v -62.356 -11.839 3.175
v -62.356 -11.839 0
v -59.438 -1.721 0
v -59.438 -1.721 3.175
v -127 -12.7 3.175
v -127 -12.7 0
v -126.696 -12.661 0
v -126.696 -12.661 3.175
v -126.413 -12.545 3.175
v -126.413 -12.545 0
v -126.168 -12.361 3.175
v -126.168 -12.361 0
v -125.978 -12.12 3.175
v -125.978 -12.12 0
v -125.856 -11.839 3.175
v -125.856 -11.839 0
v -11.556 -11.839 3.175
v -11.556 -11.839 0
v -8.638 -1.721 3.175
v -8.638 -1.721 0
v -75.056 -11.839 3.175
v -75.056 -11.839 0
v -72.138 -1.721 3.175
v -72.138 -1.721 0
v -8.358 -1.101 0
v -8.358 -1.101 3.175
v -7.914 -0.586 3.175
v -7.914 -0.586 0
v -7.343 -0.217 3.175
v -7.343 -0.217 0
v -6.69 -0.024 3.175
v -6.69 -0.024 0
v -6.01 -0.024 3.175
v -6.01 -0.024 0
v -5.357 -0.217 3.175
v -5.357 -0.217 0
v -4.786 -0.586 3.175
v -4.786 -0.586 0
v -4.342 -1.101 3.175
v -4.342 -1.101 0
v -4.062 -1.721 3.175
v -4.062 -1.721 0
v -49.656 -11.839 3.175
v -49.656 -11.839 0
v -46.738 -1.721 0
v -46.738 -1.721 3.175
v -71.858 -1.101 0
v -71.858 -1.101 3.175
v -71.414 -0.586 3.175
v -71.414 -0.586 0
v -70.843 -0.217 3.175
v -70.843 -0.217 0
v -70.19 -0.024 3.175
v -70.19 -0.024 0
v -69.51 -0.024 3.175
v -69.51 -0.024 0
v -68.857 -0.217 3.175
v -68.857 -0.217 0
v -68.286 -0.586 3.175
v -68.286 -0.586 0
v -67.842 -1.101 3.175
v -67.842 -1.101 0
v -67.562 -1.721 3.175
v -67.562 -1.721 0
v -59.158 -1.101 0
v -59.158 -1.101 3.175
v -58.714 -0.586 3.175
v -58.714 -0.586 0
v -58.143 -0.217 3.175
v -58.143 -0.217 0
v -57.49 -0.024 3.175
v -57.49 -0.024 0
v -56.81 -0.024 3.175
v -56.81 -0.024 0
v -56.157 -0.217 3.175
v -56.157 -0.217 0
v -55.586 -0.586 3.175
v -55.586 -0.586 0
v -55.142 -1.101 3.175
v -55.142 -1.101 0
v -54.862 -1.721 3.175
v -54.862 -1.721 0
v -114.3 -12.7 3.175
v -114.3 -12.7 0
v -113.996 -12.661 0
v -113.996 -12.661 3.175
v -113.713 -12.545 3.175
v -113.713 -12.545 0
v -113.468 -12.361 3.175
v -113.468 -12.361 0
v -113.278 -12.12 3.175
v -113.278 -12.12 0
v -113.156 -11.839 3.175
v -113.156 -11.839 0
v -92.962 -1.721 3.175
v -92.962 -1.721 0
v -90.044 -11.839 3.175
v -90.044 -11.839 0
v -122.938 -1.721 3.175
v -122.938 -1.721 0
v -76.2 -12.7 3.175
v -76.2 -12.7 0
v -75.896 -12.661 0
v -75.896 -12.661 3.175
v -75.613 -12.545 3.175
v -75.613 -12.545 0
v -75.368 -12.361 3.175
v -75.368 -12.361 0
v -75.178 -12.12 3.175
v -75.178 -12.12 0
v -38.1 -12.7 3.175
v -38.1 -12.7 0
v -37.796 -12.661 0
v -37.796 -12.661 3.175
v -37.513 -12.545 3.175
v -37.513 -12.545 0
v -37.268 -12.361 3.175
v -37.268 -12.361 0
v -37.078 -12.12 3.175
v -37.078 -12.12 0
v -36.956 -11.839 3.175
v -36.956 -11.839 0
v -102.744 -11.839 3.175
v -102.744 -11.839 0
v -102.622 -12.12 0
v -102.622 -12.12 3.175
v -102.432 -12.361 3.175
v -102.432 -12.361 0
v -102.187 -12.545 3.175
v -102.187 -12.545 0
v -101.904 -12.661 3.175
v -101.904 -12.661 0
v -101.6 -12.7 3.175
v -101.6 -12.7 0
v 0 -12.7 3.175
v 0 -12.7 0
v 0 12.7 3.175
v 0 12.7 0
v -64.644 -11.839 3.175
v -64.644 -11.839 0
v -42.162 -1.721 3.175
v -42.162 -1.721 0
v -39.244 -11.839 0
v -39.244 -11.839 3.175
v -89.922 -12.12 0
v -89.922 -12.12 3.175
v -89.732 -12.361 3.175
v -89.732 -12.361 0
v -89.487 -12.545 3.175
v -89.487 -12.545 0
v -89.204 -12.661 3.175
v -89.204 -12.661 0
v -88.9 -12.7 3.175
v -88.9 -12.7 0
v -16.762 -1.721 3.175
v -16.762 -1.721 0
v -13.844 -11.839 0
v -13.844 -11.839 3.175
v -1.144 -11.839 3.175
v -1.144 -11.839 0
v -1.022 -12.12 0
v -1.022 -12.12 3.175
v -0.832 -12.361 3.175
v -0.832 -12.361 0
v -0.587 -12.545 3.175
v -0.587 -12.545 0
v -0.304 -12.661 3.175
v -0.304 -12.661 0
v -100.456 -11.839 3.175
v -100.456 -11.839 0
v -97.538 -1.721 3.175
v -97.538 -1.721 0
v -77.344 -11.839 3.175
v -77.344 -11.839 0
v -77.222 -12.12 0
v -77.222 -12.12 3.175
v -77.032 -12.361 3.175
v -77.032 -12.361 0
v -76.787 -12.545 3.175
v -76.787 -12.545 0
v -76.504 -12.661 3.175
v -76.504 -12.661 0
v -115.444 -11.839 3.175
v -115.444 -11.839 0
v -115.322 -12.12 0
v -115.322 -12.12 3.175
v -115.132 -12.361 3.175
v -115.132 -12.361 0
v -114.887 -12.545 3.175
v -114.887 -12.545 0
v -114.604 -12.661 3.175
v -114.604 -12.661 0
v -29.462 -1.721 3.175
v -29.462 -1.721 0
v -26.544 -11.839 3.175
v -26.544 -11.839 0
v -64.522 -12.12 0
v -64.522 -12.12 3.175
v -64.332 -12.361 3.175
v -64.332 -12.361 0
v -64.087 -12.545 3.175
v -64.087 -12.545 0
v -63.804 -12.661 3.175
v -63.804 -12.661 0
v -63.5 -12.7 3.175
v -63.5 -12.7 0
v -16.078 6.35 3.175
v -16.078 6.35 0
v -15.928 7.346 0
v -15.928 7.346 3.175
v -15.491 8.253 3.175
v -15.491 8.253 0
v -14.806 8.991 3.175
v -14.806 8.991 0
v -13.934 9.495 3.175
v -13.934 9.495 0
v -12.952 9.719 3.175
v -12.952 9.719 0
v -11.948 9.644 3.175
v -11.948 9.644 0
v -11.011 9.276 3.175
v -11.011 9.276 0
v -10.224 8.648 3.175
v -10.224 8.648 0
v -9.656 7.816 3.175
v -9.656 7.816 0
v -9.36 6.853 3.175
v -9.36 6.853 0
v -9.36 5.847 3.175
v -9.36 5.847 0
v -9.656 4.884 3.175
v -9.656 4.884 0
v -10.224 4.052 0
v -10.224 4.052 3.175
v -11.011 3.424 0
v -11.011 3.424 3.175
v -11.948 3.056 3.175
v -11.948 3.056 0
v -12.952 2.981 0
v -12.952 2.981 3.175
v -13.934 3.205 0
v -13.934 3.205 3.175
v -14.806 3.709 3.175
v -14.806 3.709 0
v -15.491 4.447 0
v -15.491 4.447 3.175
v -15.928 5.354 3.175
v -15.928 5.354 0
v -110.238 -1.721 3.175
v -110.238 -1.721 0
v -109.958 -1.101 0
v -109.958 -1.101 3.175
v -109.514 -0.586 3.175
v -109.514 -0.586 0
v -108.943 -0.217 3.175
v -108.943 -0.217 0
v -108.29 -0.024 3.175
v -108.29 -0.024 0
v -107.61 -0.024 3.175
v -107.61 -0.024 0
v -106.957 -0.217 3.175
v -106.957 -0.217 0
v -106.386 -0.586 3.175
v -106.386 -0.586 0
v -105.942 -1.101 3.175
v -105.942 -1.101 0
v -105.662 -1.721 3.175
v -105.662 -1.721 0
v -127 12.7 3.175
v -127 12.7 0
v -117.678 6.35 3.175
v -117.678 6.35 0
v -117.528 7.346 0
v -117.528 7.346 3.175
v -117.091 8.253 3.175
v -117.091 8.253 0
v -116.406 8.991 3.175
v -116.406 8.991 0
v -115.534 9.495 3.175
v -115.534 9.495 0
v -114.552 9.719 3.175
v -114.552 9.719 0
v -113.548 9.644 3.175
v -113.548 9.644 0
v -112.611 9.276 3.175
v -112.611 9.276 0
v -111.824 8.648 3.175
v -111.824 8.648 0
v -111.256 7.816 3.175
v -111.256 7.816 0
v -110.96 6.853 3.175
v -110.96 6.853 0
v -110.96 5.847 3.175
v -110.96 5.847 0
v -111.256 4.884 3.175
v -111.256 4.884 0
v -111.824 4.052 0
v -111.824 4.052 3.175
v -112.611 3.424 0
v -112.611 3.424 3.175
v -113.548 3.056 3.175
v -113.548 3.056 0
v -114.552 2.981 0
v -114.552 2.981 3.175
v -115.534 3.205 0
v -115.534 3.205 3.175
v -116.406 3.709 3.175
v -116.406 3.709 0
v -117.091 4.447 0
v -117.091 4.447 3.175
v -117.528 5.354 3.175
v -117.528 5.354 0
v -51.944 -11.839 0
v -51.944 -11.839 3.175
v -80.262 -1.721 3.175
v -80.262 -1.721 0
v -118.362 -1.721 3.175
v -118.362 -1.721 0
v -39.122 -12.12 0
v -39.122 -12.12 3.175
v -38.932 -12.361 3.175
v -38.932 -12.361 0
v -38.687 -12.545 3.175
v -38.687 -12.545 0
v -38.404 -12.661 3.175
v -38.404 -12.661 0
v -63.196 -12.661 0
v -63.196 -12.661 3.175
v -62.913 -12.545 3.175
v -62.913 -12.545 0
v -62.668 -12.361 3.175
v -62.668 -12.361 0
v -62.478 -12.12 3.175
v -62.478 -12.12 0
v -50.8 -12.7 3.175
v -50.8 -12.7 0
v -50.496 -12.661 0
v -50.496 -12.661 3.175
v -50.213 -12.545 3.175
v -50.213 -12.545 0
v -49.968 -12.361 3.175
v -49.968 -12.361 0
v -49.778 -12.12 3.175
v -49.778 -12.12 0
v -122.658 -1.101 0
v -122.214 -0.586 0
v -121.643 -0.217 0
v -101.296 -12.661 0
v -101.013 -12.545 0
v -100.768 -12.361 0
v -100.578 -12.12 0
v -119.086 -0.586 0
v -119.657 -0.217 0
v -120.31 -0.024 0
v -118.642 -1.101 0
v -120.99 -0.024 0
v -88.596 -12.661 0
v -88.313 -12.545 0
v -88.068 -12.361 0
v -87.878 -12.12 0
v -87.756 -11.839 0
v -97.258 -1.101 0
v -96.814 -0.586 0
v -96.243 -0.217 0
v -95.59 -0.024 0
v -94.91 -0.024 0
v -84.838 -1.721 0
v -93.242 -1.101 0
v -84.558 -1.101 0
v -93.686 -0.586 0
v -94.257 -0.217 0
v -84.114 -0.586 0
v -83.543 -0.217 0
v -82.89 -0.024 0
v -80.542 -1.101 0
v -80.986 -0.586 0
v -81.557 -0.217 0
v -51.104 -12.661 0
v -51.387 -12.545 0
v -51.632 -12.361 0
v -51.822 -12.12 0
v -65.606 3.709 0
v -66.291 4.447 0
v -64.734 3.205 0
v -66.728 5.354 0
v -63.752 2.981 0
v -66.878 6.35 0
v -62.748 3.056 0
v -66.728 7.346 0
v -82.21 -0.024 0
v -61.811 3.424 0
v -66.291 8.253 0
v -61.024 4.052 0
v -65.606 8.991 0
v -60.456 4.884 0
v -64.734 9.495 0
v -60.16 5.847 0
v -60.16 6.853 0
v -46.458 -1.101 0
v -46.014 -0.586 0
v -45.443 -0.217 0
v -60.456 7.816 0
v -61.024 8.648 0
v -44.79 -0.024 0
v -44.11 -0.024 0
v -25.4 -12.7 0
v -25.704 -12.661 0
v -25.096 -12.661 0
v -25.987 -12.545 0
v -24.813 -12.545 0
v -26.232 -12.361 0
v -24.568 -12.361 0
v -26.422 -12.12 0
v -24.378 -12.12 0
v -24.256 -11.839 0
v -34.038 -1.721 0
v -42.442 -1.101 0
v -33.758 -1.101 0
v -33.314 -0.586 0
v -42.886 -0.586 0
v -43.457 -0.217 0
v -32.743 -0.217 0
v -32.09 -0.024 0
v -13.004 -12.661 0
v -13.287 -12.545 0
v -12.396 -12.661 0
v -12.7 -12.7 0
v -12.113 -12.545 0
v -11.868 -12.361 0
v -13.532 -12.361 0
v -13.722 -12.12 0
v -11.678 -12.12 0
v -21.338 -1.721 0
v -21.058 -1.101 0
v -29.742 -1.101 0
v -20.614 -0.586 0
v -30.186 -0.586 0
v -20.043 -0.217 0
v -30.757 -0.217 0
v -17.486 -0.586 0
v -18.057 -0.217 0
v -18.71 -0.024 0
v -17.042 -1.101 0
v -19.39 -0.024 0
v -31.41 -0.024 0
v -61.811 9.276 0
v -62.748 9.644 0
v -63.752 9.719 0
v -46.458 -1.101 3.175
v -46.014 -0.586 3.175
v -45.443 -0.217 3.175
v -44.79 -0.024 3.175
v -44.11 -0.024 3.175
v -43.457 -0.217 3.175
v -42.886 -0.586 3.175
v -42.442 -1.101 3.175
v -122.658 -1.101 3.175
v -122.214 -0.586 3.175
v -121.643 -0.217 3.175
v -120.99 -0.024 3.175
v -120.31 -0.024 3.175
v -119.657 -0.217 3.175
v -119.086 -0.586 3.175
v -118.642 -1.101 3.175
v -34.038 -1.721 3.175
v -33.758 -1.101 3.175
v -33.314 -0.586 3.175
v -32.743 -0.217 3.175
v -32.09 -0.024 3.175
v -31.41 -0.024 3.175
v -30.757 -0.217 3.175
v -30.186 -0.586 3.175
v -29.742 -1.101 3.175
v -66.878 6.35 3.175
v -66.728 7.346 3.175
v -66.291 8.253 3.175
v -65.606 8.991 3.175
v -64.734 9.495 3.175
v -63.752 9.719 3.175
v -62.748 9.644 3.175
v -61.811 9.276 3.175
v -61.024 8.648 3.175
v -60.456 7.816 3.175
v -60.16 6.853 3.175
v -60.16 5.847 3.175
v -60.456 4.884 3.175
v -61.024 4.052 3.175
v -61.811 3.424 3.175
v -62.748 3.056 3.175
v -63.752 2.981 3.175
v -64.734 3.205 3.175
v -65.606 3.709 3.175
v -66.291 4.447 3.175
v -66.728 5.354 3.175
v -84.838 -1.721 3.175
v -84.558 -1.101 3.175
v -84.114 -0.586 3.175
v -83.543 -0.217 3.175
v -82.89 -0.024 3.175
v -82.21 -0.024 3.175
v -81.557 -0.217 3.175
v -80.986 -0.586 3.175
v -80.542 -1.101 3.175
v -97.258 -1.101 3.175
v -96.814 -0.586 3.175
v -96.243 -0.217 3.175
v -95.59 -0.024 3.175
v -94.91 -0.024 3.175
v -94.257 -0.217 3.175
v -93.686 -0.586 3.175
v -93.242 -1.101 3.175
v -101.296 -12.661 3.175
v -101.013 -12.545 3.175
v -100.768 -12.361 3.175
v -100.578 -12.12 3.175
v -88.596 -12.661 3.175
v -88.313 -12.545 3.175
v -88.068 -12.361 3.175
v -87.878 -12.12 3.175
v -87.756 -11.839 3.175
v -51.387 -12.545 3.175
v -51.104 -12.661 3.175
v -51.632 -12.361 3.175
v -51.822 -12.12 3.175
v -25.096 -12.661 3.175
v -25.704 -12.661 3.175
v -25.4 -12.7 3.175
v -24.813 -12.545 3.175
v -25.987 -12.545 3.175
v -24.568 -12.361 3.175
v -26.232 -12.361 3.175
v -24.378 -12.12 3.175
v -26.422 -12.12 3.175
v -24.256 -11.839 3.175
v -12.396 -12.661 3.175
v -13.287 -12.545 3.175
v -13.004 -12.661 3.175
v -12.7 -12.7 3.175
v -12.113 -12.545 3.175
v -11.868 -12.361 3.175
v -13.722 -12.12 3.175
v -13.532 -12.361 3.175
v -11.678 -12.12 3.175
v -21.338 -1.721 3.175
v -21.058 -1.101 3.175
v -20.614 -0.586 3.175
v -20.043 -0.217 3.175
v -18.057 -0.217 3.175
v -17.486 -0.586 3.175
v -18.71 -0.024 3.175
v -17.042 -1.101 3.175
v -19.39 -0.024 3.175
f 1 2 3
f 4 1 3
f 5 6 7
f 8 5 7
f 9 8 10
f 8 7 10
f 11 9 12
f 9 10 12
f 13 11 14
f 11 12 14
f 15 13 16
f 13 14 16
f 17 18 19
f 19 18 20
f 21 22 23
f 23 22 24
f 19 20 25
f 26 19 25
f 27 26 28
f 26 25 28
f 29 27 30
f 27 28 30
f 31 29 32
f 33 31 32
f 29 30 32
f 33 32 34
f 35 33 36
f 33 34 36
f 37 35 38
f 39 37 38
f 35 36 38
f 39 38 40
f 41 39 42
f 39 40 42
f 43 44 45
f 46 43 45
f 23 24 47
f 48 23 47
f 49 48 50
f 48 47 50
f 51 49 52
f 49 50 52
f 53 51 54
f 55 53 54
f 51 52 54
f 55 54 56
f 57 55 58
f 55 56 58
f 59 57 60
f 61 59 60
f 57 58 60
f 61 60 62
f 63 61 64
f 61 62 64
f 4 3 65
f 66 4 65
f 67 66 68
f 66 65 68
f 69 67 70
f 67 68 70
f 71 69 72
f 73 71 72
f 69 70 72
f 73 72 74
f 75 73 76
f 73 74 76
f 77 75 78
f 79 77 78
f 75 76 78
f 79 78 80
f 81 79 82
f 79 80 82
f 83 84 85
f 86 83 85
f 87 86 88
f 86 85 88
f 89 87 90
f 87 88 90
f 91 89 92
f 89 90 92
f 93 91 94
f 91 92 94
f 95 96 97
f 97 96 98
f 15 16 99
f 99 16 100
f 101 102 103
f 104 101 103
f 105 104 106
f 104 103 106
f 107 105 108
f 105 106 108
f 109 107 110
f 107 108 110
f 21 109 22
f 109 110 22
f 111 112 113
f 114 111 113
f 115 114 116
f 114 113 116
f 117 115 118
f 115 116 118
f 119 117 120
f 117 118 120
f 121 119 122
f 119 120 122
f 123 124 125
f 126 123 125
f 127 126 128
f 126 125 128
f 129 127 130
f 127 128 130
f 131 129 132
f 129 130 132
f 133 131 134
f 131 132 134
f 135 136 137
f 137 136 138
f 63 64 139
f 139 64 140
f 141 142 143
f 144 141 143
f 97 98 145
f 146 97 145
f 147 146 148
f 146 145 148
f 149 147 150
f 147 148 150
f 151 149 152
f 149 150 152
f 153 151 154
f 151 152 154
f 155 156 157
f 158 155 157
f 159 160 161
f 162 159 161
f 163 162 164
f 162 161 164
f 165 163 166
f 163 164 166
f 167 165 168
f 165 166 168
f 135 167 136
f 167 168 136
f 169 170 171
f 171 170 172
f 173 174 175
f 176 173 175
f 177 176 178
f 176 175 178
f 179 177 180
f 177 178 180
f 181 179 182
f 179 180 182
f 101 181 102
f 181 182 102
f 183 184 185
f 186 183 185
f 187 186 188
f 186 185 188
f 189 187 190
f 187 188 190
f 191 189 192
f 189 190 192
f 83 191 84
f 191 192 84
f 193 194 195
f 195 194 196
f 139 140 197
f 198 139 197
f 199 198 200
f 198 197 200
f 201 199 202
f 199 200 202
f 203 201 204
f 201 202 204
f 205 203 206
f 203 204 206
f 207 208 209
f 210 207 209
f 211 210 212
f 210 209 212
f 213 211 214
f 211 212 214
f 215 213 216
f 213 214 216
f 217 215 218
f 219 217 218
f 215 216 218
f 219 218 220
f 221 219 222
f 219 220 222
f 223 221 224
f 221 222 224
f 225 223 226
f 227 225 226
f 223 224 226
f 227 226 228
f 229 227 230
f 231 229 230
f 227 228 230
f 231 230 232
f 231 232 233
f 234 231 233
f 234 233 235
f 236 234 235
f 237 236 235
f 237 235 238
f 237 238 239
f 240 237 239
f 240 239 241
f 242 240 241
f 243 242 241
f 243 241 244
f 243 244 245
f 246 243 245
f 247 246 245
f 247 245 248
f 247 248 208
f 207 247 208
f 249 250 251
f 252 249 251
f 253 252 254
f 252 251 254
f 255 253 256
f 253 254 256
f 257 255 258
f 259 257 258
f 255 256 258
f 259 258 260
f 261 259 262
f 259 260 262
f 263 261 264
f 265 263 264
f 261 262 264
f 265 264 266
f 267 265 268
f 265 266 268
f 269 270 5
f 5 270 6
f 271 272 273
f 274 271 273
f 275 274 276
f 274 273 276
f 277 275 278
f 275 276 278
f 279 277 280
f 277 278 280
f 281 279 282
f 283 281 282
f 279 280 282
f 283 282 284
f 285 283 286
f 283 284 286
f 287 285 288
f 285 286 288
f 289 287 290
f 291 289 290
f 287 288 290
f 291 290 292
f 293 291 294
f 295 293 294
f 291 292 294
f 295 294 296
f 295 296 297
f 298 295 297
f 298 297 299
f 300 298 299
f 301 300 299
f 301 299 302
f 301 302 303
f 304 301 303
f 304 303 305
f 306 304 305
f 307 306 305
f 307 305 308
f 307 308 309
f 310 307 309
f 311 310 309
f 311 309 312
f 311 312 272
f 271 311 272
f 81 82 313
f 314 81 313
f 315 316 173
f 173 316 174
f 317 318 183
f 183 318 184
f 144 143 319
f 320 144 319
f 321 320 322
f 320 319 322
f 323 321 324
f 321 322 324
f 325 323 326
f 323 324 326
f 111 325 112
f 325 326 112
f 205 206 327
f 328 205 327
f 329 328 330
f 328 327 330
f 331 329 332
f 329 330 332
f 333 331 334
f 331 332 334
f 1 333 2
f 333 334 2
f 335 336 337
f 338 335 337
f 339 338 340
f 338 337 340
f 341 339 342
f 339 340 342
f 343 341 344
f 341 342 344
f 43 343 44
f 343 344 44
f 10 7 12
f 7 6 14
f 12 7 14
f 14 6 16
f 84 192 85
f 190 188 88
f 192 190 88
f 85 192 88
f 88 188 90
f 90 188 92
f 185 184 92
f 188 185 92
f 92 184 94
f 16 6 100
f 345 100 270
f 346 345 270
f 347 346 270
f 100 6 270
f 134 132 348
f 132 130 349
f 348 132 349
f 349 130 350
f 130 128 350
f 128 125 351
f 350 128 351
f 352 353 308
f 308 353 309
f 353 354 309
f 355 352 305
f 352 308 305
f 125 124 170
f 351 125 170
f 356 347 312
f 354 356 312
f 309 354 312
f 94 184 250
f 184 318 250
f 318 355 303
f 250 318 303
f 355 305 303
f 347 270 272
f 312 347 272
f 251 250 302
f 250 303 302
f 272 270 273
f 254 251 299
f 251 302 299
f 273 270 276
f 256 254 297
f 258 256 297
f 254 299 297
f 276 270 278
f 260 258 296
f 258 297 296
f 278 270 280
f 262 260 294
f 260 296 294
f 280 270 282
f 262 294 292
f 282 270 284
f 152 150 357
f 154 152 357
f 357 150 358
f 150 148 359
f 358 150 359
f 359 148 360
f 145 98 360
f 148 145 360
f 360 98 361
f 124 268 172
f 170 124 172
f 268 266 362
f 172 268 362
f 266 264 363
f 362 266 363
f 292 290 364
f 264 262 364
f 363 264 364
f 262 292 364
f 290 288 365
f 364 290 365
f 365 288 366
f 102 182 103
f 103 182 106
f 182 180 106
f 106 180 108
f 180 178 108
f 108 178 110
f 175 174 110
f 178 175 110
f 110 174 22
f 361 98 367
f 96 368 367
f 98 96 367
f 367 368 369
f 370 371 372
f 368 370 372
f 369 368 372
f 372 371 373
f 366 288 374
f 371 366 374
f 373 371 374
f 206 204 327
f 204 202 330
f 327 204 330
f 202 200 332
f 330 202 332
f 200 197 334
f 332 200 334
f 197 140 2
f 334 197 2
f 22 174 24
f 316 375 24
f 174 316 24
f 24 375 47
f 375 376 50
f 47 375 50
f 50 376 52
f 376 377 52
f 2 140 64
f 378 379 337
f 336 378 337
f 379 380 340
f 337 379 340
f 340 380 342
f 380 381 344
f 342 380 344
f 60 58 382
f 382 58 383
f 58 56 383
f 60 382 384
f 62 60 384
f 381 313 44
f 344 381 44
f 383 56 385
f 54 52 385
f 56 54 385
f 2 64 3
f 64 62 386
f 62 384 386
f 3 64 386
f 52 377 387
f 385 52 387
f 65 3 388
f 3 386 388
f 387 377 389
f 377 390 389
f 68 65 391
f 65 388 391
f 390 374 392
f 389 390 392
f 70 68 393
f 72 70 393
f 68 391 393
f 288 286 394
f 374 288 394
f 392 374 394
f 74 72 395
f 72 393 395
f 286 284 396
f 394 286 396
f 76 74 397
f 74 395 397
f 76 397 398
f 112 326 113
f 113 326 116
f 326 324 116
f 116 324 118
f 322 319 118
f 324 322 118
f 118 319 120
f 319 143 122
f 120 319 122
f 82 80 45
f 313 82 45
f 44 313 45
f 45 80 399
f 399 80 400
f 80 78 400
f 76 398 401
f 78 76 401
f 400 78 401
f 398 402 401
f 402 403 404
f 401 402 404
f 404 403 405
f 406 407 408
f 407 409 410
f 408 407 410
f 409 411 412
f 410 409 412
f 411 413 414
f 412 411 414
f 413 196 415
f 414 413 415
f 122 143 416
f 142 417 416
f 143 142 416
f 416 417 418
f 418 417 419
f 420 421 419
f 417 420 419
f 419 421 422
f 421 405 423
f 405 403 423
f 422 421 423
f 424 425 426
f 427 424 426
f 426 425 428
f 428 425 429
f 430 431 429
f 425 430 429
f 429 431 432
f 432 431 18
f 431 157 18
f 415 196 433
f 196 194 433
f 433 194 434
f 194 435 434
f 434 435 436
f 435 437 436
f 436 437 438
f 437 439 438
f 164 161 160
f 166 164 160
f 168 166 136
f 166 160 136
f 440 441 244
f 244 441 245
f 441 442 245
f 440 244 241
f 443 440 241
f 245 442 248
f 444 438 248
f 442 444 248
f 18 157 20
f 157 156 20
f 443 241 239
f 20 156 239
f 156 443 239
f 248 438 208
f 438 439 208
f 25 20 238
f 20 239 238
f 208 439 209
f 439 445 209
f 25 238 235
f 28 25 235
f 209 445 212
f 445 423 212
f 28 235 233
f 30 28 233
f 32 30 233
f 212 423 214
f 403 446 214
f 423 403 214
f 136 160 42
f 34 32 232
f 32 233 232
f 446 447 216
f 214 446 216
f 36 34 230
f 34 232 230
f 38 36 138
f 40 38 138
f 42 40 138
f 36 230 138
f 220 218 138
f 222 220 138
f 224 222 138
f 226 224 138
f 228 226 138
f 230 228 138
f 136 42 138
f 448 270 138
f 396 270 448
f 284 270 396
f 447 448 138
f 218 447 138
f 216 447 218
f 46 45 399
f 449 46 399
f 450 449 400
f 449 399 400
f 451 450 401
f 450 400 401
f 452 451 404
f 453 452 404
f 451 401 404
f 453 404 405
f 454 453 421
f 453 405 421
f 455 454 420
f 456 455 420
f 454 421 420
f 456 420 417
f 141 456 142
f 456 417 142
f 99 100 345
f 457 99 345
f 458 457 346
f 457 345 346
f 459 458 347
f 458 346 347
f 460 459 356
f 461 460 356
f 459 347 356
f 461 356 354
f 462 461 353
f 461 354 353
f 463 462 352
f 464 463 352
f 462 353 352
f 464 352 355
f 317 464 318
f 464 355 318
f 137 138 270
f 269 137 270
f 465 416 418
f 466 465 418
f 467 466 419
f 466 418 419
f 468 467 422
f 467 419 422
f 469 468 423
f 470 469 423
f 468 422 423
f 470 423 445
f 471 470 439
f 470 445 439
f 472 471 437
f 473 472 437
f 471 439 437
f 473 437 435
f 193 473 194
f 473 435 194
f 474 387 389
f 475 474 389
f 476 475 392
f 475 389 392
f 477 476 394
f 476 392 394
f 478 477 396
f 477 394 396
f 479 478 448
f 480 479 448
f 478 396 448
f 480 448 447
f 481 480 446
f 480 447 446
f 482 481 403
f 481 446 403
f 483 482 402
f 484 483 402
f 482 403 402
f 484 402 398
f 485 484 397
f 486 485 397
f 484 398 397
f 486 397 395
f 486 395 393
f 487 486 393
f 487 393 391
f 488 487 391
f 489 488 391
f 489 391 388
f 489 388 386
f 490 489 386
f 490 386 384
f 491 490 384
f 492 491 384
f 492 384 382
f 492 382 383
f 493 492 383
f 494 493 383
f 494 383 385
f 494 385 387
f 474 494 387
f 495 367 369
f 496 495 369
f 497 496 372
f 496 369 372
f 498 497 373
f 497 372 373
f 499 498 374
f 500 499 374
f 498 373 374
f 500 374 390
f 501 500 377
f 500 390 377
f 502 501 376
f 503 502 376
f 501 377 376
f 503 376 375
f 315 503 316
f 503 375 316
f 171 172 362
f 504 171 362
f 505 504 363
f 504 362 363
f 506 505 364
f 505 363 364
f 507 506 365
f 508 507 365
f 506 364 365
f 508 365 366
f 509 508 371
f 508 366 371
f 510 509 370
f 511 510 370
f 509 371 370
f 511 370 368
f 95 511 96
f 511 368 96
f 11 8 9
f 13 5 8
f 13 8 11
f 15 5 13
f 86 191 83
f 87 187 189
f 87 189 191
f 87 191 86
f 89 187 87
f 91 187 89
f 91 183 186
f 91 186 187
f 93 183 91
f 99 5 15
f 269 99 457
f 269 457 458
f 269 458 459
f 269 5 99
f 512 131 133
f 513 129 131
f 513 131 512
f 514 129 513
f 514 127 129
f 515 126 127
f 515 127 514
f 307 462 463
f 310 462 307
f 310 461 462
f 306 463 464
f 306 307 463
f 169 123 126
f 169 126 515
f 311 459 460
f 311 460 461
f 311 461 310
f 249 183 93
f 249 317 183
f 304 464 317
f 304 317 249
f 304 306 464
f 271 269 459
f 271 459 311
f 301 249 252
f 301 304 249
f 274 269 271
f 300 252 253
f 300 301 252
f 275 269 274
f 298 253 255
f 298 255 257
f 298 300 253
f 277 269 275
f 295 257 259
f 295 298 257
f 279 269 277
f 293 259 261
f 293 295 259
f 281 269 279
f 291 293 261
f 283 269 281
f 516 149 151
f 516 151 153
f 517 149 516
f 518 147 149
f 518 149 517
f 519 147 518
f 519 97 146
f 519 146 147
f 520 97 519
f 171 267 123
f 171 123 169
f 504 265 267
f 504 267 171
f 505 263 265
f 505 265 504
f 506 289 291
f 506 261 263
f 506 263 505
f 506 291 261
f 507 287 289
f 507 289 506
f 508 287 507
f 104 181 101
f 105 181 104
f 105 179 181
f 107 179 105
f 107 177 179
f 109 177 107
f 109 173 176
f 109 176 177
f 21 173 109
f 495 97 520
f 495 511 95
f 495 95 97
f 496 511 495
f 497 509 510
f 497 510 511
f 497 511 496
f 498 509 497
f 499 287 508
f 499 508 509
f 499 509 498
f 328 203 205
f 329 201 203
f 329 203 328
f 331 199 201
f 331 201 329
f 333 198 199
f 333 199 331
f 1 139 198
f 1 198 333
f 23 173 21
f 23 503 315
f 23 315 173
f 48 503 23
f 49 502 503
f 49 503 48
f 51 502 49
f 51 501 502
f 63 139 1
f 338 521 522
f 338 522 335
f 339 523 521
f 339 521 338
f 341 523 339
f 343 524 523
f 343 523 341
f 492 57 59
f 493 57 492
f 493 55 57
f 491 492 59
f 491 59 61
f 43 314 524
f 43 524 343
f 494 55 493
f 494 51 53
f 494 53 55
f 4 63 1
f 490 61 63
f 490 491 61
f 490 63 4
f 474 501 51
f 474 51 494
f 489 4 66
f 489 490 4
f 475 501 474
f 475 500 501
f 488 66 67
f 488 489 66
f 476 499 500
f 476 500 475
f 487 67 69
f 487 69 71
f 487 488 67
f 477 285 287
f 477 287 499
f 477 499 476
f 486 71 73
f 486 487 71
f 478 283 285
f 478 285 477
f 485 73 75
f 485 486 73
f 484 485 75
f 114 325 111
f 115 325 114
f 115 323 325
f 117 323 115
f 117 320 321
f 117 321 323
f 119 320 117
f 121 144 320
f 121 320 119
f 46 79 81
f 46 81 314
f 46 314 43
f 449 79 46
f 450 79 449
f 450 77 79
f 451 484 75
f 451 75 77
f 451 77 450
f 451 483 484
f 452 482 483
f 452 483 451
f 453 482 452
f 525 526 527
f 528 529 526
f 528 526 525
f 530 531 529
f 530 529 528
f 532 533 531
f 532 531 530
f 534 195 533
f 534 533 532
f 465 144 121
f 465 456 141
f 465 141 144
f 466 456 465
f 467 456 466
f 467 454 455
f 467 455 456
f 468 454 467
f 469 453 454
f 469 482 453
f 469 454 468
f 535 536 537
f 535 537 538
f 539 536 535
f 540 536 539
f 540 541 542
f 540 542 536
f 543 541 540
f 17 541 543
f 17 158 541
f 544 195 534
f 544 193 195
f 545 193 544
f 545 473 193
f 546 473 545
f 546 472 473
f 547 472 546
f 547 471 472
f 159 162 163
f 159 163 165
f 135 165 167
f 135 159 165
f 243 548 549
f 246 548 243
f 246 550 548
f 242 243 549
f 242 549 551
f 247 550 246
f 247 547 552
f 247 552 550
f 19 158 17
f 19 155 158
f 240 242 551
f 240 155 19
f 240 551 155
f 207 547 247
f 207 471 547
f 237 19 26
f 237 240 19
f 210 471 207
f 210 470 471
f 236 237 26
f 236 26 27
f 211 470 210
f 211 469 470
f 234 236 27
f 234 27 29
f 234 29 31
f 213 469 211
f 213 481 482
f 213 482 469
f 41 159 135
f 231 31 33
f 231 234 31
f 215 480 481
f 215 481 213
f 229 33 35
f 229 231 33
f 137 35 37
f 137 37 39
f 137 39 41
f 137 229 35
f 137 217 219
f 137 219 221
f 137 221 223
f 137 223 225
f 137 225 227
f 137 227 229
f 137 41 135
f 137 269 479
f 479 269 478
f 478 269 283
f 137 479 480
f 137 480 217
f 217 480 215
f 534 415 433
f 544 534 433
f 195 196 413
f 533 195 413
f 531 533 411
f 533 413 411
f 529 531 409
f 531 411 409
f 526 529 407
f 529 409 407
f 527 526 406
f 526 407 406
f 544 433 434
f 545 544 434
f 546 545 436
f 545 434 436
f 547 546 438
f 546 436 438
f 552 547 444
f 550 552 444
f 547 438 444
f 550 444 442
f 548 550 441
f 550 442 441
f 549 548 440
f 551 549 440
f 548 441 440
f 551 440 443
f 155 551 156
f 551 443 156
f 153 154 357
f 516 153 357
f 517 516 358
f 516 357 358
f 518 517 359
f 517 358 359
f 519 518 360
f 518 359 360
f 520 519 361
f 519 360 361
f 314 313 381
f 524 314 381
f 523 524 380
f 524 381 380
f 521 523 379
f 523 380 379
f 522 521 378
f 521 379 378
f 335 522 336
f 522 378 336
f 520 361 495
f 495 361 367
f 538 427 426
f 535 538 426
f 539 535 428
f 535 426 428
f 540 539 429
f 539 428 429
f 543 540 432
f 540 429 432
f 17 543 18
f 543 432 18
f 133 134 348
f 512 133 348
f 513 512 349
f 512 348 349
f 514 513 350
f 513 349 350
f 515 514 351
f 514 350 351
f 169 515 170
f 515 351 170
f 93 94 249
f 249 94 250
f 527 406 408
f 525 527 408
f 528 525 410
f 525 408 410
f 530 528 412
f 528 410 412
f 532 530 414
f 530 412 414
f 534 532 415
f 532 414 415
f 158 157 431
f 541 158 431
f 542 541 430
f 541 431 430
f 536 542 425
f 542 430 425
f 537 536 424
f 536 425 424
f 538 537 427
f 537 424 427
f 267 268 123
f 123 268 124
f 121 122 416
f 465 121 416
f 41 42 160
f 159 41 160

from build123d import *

# Parameters (mm, degrees)
F1_DEPTH = 3.175
F3_D     = 6.7564


# Not quite as in the source:
# - a feature names something its author has since deleted; it is built from what else it names


with BuildPart() as f1:
    # F0 (on Top) → F1 (new body)
    with BuildSketch(Plane.XY):
        with BuildLine():
            Line((0, 0), (0, 12.7))
            Line((0, 12.7), (-127, 12.7))
            Line((-127, 12.7), (-127, 0))
            Line((-127, 0), (-127, -12.7))
            ThreePointArc((-127, -12.7), (-126.2841905951, -12.4607975068), (-125.8560005402, -11.839303972))
            Line((-125.8560005402, -11.839303972), (-122.9379989196, -1.7213920559))
            ThreePointArc((-122.9379989196, -1.7213920559), (-120.65, 0), (-118.3620010804, -1.7213920559))
            Line((-118.3620010804, -1.7213920559), (-115.4439994598, -11.839303972))
            ThreePointArc((-115.4439994598, -11.839303972), (-115.0158094049, -12.4607975068), (-114.3, -12.7))
            ThreePointArc((-114.3, -12.7), (-113.5841905951, -12.4607975068), (-113.1560005402, -11.839303972))
            Line((-113.1560005402, -11.839303972), (-110.2379989196, -1.7213920559))
            ThreePointArc((-110.2379989196, -1.7213920559), (-107.95, 0), (-105.6620010804, -1.7213920559))
            Line((-105.6620010804, -1.7213920559), (-102.7439994598, -11.839303972))
            ThreePointArc((-102.7439994598, -11.839303972), (-102.3158094049, -12.4607975068), (-101.6, -12.7))
            ThreePointArc((-101.6, -12.7), (-100.8841905951, -12.4607975068), (-100.4560005402, -11.839303972))
            Line((-100.4560005402, -11.839303972), (-97.5379989196, -1.7213920559))
            ThreePointArc((-97.5379989196, -1.7213920559), (-95.25, 0), (-92.9620010804, -1.7213920559))
            Line((-92.9620010804, -1.7213920559), (-90.0439994598, -11.839303972))
            ThreePointArc((-90.0439994598, -11.839303972), (-89.6158094049, -12.4607975068), (-88.9, -12.7))
            ThreePointArc((-88.9, -12.7), (-88.1841905951, -12.4607975068), (-87.7560005402, -11.839303972))
            Line((-87.7560005402, -11.839303972), (-84.8379989196, -1.7213920559))
            ThreePointArc((-84.8379989196, -1.7213920559), (-82.55, 0), (-80.2620010804, -1.7213920559))
            Line((-80.2620010804, -1.7213920559), (-77.3439994598, -11.839303972))
            ThreePointArc((-77.3439994598, -11.839303972), (-76.9158094049, -12.4607975068), (-76.2, -12.7))
            ThreePointArc((-76.2, -12.7), (-75.4841905951, -12.4607975068), (-75.0560005402, -11.839303972))
            Line((-75.0560005402, -11.839303972), (-72.1379989196, -1.7213920559))
            ThreePointArc((-72.1379989196, -1.7213920559), (-69.85, 0), (-67.5620010804, -1.7213920559))
            Line((-67.5620010804, -1.7213920559), (-64.6439994598, -11.839303972))
            ThreePointArc((-64.6439994598, -11.839303972), (-64.2158094049, -12.4607975068), (-63.5, -12.7))
            ThreePointArc((-63.5, -12.7), (-62.7841905951, -12.4607975068), (-62.3560005402, -11.839303972))
            Line((-62.3560005402, -11.839303972), (-59.4379989196, -1.7213920559))
            ThreePointArc((-59.4379989196, -1.7213920559), (-57.15, 0), (-54.8620010804, -1.7213920559))
            Line((-54.8620010804, -1.7213920559), (-51.9439994598, -11.839303972))
            ThreePointArc((-51.9439994598, -11.839303972), (-51.5158094049, -12.4607975068), (-50.8, -12.7))
            ThreePointArc((-50.8, -12.7), (-50.0841905951, -12.4607975068), (-49.6560005402, -11.839303972))
            Line((-49.6560005402, -11.839303972), (-46.7379989196, -1.7213920559))
            ThreePointArc((-46.7379989196, -1.7213920559), (-44.45, 0), (-42.1620010804, -1.7213920559))
            Line((-42.1620010804, -1.7213920559), (-39.2439994598, -11.839303972))
            ThreePointArc((-39.2439994598, -11.839303972), (-38.8158094049, -12.4607975068), (-38.1, -12.7))
            ThreePointArc((-38.1, -12.7), (-37.3841905951, -12.4607975068), (-36.9560005402, -11.839303972))
            Line((-36.9560005402, -11.839303972), (-34.0379989196, -1.7213920559))
            ThreePointArc((-34.0379989196, -1.7213920559), (-31.75, 0), (-29.4620010804, -1.7213920559))
            Line((-29.4620010804, -1.7213920559), (-26.5439994598, -11.839303972))
            ThreePointArc((-26.5439994598, -11.839303972), (-26.1158094049, -12.4607975068), (-25.4, -12.7))
            ThreePointArc((-25.4, -12.7), (-24.6841905951, -12.4607975068), (-24.2560005402, -11.839303972))
            Line((-24.2560005402, -11.839303972), (-21.3379989196, -1.7213920559))
            ThreePointArc((-21.3379989196, -1.7213920559), (-19.05, 0), (-16.7620010804, -1.7213920559))
            Line((-16.7620010804, -1.7213920559), (-13.8439994598, -11.839303972))
            ThreePointArc((-13.8439994598, -11.839303972), (-13.4158094049, -12.4607975068), (-12.7, -12.7))
            ThreePointArc((-12.7, -12.7), (-11.9841905951, -12.4607975068), (-11.5560005402, -11.839303972))
            Line((-11.5560005402, -11.839303972), (-8.6379989196, -1.7213920559))
            ThreePointArc((-8.6379989196, -1.7213920559), (-6.35, 0), (-4.0620010804, -1.7213920559))
            Line((-4.0620010804, -1.7213920559), (-1.1439994598, -11.839303972))
            ThreePointArc((-1.1439994598, -11.839303972), (-0.7158094049, -12.4607975068), (0, -12.7))
            Line((0, -12.7), (0, 0))
        make_face()
    extrude(amount=F1_DEPTH)

    # F3 (through all)
    with Locations(Plane.XY.offset(3.175)):
        with Locations((-114.3, 6.35), (-63.5, 6.35), (-12.7, 6.35)):
            Hole(F3_D / 2)


solid = f1.part
